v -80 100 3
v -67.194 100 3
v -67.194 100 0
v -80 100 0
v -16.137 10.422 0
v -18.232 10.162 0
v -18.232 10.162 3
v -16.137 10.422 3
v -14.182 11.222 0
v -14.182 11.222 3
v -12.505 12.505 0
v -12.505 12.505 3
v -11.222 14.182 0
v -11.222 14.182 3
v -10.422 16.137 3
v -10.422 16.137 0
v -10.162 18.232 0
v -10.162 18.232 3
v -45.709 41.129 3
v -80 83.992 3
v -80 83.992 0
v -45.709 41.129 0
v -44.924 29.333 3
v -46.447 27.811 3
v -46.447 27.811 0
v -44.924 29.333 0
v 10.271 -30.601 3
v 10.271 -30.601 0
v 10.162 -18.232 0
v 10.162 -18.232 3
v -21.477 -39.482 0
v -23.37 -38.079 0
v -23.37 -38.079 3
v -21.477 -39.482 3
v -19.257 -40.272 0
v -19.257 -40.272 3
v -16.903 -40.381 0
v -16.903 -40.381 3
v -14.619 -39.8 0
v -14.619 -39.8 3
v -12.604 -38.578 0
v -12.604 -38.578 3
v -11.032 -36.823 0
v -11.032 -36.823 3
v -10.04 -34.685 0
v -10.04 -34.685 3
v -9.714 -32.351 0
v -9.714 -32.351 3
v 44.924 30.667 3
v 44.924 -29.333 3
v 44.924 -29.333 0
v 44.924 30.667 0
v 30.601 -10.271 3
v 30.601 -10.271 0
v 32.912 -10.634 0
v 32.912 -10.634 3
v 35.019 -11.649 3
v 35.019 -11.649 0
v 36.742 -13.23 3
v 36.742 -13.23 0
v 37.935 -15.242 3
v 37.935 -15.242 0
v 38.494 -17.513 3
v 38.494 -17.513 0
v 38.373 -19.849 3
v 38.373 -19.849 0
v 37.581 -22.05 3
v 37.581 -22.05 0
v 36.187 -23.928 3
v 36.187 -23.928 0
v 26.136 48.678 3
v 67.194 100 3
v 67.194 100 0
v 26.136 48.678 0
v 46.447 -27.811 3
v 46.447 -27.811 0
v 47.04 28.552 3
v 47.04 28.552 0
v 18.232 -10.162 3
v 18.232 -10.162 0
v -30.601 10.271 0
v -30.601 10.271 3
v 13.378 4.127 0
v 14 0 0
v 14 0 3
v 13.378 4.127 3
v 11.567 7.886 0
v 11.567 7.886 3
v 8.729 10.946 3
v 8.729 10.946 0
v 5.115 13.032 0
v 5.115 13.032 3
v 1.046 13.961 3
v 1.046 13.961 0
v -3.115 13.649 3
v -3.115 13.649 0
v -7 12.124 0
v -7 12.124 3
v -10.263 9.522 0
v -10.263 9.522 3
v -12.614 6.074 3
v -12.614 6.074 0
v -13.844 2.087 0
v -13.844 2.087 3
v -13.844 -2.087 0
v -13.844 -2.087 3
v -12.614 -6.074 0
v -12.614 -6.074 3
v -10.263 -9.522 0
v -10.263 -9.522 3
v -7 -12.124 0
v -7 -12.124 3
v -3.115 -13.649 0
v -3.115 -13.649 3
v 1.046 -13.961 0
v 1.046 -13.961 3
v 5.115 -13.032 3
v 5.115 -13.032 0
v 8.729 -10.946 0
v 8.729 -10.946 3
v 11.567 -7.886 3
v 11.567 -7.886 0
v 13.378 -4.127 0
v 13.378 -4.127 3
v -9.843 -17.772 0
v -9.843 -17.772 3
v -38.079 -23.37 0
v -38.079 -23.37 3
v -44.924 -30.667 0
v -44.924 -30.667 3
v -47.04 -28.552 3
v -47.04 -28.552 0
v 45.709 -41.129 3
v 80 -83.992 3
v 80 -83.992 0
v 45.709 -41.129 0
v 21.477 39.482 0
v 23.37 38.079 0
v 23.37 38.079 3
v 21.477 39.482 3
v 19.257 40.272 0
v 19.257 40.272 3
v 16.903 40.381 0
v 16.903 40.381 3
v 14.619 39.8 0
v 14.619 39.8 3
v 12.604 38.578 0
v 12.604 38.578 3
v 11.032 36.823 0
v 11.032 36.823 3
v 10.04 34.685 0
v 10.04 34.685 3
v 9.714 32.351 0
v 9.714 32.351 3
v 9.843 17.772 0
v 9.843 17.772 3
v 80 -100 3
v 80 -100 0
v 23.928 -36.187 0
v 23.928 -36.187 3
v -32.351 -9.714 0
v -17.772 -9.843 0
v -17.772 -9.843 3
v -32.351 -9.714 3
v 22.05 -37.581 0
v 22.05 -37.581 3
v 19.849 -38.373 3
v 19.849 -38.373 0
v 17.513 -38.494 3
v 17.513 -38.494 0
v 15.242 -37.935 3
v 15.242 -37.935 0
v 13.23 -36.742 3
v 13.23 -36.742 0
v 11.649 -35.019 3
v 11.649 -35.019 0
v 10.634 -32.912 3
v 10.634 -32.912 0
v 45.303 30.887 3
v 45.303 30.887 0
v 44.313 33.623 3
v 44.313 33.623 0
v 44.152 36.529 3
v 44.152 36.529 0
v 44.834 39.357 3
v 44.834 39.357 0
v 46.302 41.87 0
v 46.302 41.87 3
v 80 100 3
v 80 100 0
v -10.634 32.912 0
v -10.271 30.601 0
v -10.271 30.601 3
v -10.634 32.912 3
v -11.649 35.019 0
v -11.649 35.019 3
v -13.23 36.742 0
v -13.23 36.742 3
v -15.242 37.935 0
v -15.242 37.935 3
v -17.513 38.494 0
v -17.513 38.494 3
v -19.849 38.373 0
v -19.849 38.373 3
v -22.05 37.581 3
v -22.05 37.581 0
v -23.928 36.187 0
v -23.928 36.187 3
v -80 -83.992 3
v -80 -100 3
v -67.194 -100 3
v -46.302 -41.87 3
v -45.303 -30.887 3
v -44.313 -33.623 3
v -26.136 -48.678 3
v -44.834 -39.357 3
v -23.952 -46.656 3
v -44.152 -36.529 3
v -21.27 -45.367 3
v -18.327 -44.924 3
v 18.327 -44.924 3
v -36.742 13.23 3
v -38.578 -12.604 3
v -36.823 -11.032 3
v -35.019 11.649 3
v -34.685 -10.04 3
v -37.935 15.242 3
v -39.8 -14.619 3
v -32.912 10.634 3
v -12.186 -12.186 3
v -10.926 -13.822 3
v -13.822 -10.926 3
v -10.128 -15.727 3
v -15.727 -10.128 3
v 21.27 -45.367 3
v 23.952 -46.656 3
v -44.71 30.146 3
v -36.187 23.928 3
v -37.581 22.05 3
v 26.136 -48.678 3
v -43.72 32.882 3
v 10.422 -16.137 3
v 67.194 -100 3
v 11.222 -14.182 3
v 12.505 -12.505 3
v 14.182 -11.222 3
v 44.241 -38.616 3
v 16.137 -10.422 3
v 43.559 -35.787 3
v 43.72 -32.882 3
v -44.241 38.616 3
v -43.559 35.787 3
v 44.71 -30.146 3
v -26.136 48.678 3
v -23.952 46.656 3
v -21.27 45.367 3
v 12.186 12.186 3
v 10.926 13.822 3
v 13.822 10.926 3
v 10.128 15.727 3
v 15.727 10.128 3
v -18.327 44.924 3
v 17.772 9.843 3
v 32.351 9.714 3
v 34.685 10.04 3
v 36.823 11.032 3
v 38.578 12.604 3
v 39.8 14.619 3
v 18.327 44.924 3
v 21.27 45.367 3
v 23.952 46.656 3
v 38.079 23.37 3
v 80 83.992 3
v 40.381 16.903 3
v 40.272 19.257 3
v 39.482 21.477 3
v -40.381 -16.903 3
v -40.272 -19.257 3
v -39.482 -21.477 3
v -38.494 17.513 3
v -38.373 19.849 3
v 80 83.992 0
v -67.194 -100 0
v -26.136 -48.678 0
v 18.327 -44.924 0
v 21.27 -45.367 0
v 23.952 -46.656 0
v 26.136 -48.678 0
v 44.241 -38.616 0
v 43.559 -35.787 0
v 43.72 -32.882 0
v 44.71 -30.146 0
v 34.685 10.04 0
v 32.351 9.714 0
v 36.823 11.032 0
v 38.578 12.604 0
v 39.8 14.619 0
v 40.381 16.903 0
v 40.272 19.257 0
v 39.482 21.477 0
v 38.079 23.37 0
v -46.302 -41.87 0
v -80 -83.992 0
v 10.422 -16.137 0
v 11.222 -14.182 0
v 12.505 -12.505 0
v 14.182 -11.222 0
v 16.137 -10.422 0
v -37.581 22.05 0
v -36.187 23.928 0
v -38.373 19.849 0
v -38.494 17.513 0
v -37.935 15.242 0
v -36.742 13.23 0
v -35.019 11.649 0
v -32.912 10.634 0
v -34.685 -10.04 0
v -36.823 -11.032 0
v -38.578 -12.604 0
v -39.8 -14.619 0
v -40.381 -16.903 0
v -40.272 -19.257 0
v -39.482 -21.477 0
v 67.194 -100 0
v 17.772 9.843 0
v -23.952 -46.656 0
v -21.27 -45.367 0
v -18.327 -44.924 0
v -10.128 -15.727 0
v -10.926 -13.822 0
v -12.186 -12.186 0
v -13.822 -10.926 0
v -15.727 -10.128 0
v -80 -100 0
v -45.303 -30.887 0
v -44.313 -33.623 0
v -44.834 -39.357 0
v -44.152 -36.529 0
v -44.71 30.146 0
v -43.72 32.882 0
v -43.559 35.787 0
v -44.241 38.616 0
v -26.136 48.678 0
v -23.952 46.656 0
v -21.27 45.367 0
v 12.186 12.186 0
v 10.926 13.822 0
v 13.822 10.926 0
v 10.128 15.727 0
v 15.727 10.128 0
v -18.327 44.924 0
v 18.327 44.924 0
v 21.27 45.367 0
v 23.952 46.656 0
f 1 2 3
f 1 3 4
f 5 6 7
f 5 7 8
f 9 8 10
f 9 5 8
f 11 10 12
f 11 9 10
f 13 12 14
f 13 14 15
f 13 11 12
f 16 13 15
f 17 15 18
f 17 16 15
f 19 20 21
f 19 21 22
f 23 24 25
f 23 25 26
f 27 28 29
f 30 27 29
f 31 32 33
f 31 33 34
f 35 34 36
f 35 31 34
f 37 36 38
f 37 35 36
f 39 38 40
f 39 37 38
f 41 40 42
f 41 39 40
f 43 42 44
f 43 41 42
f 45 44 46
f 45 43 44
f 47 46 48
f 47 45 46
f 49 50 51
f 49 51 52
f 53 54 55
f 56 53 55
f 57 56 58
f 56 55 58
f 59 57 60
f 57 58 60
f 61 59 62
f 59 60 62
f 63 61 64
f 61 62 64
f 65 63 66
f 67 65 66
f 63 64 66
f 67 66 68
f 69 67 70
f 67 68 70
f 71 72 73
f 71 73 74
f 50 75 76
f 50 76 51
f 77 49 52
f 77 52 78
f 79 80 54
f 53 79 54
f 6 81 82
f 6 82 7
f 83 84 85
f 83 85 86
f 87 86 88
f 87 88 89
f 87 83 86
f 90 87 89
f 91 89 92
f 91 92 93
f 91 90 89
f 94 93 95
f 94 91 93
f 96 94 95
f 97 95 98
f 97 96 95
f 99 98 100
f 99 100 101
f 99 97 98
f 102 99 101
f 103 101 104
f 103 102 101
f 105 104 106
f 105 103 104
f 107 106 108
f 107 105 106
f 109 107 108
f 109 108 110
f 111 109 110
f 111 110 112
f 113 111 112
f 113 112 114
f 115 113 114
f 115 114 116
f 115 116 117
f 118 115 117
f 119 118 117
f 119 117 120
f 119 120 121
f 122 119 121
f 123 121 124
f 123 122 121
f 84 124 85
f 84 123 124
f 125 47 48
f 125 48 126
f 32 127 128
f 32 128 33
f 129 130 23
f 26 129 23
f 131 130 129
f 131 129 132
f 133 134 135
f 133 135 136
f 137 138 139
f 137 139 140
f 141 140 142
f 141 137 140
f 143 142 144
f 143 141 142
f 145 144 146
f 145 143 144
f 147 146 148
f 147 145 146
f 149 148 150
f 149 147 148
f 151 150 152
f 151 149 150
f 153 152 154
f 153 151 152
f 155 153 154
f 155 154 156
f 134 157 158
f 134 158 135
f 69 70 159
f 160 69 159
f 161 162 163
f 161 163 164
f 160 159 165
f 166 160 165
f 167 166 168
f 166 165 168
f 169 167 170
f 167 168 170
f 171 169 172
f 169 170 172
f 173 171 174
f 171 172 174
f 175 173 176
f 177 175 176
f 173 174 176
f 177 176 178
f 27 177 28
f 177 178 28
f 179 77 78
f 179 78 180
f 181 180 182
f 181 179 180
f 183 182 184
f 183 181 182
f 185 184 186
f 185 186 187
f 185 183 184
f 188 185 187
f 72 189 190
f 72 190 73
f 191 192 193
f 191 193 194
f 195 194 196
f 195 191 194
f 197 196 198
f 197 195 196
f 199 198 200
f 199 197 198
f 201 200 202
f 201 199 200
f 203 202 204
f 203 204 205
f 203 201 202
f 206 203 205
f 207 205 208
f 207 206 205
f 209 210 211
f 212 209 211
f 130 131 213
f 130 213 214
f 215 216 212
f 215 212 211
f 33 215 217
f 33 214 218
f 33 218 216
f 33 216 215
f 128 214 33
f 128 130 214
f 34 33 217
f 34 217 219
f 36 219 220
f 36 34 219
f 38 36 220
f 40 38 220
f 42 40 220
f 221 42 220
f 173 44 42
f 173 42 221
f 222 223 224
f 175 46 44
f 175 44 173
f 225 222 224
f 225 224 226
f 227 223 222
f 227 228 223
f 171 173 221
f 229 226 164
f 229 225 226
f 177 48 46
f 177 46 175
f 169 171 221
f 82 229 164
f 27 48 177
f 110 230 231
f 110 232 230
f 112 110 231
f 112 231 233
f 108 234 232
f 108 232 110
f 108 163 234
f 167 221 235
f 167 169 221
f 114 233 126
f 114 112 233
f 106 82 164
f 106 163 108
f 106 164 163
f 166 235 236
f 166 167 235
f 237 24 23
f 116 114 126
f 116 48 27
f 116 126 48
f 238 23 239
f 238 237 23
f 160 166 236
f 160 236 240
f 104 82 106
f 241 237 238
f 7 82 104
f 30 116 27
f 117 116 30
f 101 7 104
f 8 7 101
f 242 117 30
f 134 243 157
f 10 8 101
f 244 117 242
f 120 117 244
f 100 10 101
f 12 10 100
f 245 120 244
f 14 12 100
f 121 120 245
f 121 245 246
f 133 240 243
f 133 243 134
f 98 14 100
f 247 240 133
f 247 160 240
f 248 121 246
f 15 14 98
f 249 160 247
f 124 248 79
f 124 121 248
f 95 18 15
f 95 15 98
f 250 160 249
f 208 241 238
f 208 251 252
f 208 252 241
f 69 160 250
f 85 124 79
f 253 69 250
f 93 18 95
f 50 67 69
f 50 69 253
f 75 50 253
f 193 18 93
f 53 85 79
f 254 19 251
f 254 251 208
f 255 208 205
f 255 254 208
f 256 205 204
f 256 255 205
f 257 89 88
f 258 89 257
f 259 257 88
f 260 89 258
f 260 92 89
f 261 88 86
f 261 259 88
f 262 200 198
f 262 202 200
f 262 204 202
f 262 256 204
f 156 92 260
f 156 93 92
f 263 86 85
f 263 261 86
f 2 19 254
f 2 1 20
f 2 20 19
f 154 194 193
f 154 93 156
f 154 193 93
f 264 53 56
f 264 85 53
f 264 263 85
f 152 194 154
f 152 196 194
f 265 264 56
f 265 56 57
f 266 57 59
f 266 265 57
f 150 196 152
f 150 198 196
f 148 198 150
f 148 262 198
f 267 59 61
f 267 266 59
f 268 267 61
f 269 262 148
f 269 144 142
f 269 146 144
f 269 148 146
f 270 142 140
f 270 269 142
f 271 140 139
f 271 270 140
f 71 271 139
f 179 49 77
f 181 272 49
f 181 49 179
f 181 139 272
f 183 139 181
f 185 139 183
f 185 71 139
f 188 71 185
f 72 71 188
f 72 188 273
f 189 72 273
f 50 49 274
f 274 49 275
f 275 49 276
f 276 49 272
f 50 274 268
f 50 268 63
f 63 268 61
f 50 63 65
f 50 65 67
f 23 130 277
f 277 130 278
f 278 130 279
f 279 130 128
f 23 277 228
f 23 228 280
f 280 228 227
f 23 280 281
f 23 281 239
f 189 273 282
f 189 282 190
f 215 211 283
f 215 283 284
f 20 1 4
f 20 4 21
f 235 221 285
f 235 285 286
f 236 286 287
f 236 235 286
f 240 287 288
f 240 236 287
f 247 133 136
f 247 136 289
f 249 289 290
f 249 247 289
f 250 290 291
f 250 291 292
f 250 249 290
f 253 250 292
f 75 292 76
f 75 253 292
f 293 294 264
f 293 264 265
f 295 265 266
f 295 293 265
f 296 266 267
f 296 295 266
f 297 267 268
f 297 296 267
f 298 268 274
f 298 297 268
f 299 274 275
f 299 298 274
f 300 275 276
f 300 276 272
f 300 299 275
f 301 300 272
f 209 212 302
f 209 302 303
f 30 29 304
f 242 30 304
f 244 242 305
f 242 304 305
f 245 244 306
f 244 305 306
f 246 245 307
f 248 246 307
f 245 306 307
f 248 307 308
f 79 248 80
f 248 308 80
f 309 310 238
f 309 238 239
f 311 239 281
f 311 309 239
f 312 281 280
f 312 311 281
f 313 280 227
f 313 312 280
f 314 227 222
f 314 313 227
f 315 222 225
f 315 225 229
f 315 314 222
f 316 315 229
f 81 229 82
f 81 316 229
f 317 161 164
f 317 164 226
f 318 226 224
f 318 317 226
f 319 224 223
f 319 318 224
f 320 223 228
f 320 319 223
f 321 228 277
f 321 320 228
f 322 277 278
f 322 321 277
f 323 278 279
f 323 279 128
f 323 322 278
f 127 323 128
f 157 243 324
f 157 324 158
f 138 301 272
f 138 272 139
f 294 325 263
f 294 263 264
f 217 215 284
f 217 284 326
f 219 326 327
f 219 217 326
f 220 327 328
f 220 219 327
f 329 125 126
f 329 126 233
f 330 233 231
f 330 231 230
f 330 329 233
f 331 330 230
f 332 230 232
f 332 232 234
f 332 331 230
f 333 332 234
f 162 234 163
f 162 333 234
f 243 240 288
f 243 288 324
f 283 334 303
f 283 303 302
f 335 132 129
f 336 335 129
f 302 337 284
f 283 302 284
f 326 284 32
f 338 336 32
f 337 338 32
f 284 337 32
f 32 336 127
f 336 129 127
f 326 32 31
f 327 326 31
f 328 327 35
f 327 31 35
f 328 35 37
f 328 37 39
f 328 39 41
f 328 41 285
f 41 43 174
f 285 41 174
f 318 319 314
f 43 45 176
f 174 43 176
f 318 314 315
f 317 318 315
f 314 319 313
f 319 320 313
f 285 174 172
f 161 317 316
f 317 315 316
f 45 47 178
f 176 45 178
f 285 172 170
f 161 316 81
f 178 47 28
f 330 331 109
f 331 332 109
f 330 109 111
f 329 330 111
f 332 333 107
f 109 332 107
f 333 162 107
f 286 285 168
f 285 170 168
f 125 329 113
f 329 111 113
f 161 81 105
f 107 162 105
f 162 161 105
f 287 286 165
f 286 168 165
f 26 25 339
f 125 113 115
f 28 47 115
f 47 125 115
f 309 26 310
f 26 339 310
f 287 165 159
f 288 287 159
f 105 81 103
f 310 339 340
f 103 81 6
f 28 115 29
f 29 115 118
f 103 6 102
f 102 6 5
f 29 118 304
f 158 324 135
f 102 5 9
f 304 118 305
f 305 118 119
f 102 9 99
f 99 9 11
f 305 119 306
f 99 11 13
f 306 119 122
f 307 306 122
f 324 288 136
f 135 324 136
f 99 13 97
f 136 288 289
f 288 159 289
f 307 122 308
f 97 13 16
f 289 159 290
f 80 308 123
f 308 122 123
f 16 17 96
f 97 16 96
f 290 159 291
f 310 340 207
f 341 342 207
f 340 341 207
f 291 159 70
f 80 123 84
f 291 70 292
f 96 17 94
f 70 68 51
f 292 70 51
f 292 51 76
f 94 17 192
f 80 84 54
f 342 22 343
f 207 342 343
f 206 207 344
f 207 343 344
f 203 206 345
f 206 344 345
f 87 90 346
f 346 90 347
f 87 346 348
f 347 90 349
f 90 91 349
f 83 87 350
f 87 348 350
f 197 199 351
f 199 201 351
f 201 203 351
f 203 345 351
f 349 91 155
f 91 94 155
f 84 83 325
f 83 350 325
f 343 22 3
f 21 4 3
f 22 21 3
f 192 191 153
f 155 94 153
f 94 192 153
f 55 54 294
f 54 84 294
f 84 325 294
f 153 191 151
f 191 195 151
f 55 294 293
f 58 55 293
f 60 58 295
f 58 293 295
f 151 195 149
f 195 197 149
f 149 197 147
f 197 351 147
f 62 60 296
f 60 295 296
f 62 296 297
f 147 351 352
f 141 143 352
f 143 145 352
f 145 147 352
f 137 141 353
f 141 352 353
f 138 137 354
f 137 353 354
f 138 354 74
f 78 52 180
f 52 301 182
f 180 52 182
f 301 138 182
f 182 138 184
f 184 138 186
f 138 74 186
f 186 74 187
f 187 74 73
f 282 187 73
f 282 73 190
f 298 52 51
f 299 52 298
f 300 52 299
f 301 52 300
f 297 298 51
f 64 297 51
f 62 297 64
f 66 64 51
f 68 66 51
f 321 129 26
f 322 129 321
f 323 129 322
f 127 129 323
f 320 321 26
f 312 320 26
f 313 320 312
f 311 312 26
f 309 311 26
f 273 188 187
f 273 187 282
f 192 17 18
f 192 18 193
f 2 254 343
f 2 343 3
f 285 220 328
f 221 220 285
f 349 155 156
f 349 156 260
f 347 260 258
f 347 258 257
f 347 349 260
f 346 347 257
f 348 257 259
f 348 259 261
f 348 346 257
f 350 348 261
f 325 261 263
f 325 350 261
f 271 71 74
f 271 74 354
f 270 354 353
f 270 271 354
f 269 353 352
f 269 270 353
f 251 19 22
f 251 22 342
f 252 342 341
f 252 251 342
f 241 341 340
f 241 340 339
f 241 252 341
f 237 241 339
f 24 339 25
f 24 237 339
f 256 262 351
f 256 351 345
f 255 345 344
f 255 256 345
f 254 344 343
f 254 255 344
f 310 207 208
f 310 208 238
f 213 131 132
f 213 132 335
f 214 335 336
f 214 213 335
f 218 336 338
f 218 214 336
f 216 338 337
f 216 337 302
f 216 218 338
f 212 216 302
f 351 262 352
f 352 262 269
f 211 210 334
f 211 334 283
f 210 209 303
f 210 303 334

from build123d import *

# Parameters (mm, degrees)
SKETCH1_R           = 14
BOSS_EXTRUDE1_DEPTH = 3
SKETCH2_OUTSIDE_W   = 194.236
SKETCH2_OUTSIDE_H   = 194.236
SKETCH2_OUTSIDE_W_2 = 89.848932168
SKETCH2_OUTSIDE_H_2 = 89.848932168
CUT_EXTRUDE1_DEPTH  = 3
BOSS_EXTRUDE2_DEPTH = 3


with BuildPart() as part:
    # Sketch1 → Boss-Extrude1 (new body)
    with BuildSketch(Plane.XY):
        Polygon((0.667250758, 74.924466084), (-74.924466084, -0.667250758), (-0.667250758, -74.924466084), (74.924466084, 0.667250758), align=None)
        Circle(SKETCH1_R, mode=Mode.SUBTRACT)
        with BuildLine():
            Line((36.187095947, -23.927983755), (23.927983755, -36.187095947))
            ThreePointArc((23.927983755, -36.187095947), (15.242424375, -37.934763642), (10.271443313, -30.601099389))
            Line((10.271443313, -30.601099389), (10.161887104, -18.232430989))
            ThreePointArc((10.161887104, -18.232430989), (12.504719048, -12.504719048), (18.232430989, -10.161887104))
            Line((18.232430989, -10.161887104), (30.601099389, -10.271443313))
            ThreePointArc((30.601099389, -10.271443313), (37.934763642, -15.242424375), (36.187095947, -23.927983755))
        make_face(mode=Mode.SUBTRACT)
        with BuildLine():
            Line((-23.927983755, 36.187095947), (-36.187095947, 23.927983755))
            ThreePointArc((-36.187095947, 23.927983755), (-37.934763642, 15.242424375), (-30.601099389, 10.271443313))
            Line((-30.601099389, 10.271443313), (-18.232430989, 10.161887104))
            ThreePointArc((-18.232430989, 10.161887104), (-12.504719048, 12.504719048), (-10.161887104, 18.232430989))
            Line((-10.161887104, 18.232430989), (-10.271443313, 30.601099389))
            ThreePointArc((-10.271443313, 30.601099389), (-15.242424375, 37.934763642), (-23.927983755, 36.187095947))
        make_face(mode=Mode.SUBTRACT)
        with BuildLine():
            Line((-38.079203745, -23.370377474), (-23.370377474, -38.079203745))
            ThreePointArc((-23.370377474, -38.079203745), (-14.619353482, -39.79975511), (-9.713837032, -32.351491804))
            Line((-9.713837032, -32.351491804), (-9.842977457, -17.771805959))
            ThreePointArc((-9.842977457, -17.771805959), (-12.185809401, -12.185809401), (-17.771805959, -9.842977457))
            Line((-17.771805959, -9.842977457), (-32.351491804, -9.713837032))
            ThreePointArc((-32.351491804, -9.713837032), (-39.79975511, -14.619353482), (-38.079203745, -23.370377474))
        make_face(mode=Mode.SUBTRACT)
        with BuildLine():
            Line((9.713837032, 32.351491804), (9.842977457, 17.771805959))
            ThreePointArc((9.842977457, 17.771805959), (12.185809401, 12.185809401), (17.771805959, 9.842977457))
            Line((17.771805959, 9.842977457), (32.351491804, 9.713837032))
            ThreePointArc((32.351491804, 9.713837032), (39.79975511, 14.619353482), (38.079203745, 23.370377474))
            Line((38.079203745, 23.370377474), (23.370377474, 38.079203745))
            ThreePointArc((23.370377474, 38.079203745), (14.619353482, 39.79975511), (9.713837032, 32.351491804))
        make_face(mode=Mode.SUBTRACT)
    extrude(amount=BOSS_EXTRUDE1_DEPTH)

    # Sketch2 outside → Cut-Extrude1 (cut)
    with BuildSketch(Plane.XY.offset(3)):
        Rectangle(SKETCH2_OUTSIDE_W, SKETCH2_OUTSIDE_H)
        Rectangle(SKETCH2_OUTSIDE_W_2, SKETCH2_OUTSIDE_H_2, mode=Mode.SUBTRACT)
    extrude(amount=-CUT_EXTRUDE1_DEPTH, mode=Mode.SUBTRACT)

    # Sketch3 → Boss-Extrude2 (add)
    with BuildSketch(Plane.XY.offset(3)):
        with BuildLine():
            Line((-80, -100), (-67.193751525, -100))
            Line((-67.193751525, -100), (-26.135764012, -48.677515609))
            ThreePointArc((-26.135764012, -48.677515609), (-22.658963222, -45.911433721), (-18.327075918, -44.924466084))
            Line((-18.327075918, -44.924466084), (-30.667250758, -44.924466084))
            Line((-30.667250758, -44.924466084), (-47.039809367, -28.551907475))
            ThreePointArc((-47.039809367, -28.551907475), (-44.126179551, -35.06997143), (-46.302189085, -41.869925762))
            Line((-46.302189085, -41.869925762), (-80, -83.992189406))
            Line((-80, -83.992189406), (-80, -100))
        make_face()
        with BuildLine():
            Line((29.332749242, -44.924466084), (18.327075918, -44.924466084))
            ThreePointArc((18.327075918, -44.924466084), (22.658963222, -45.911433721), (26.135764012, -48.677515609))
            Line((26.135764012, -48.677515609), (67.193751525, -100))
            Line((67.193751525, -100), (80, -100))
            Line((80, -100), (80, -83.992189406))
            Line((80, -83.992189406), (45.7090773, -41.128536031))
            ThreePointArc((45.7090773, -41.128536031), (43.533067766, -34.328581698), (46.446697582, -27.810517744))
            Line((46.446697582, -27.810517744), (29.332749242, -44.924466084))
        make_face()
        with BuildLine():
            Line((-46.446697582, 27.810517744), (-29.332749242, 44.924466084))
            Line((-29.332749242, 44.924466084), (-18.327075918, 44.924466084))
            ThreePointArc((-18.327075918, 44.924466084), (-22.658963222, 45.911433721), (-26.135764012, 48.677515609))
            Line((-26.135764012, 48.677515609), (-67.193751525, 100))
            Line((-67.193751525, 100), (-80, 100))
            Line((-80, 100), (-80, 83.992189406))
            Line((-80, 83.992189406), (-45.7090773, 41.128536031))
            ThreePointArc((-45.7090773, 41.128536031), (-43.533067766, 34.328581698), (-46.446697582, 27.810517744))
        make_face()
        with BuildLine():
            Line((30.667250758, 44.924466084), (47.039809367, 28.551907475))
            ThreePointArc((47.039809367, 28.551907475), (44.126179551, 35.06997143), (46.302189085, 41.869925762))
            Line((46.302189085, 41.869925762), (80, 83.992189406))
            Line((80, 83.992189406), (80, 100))
            Line((80, 100), (67.193751525, 100))
            Line((67.193751525, 100), (26.135764012, 48.677515609))
            ThreePointArc((26.135764012, 48.677515609), (22.658963222, 45.911433721), (18.327075918, 44.924466084))
            Line((18.327075918, 44.924466084), (30.667250758, 44.924466084))
        make_face()
    extrude(amount=-BOSS_EXTRUDE2_DEPTH)


solid = part.part
